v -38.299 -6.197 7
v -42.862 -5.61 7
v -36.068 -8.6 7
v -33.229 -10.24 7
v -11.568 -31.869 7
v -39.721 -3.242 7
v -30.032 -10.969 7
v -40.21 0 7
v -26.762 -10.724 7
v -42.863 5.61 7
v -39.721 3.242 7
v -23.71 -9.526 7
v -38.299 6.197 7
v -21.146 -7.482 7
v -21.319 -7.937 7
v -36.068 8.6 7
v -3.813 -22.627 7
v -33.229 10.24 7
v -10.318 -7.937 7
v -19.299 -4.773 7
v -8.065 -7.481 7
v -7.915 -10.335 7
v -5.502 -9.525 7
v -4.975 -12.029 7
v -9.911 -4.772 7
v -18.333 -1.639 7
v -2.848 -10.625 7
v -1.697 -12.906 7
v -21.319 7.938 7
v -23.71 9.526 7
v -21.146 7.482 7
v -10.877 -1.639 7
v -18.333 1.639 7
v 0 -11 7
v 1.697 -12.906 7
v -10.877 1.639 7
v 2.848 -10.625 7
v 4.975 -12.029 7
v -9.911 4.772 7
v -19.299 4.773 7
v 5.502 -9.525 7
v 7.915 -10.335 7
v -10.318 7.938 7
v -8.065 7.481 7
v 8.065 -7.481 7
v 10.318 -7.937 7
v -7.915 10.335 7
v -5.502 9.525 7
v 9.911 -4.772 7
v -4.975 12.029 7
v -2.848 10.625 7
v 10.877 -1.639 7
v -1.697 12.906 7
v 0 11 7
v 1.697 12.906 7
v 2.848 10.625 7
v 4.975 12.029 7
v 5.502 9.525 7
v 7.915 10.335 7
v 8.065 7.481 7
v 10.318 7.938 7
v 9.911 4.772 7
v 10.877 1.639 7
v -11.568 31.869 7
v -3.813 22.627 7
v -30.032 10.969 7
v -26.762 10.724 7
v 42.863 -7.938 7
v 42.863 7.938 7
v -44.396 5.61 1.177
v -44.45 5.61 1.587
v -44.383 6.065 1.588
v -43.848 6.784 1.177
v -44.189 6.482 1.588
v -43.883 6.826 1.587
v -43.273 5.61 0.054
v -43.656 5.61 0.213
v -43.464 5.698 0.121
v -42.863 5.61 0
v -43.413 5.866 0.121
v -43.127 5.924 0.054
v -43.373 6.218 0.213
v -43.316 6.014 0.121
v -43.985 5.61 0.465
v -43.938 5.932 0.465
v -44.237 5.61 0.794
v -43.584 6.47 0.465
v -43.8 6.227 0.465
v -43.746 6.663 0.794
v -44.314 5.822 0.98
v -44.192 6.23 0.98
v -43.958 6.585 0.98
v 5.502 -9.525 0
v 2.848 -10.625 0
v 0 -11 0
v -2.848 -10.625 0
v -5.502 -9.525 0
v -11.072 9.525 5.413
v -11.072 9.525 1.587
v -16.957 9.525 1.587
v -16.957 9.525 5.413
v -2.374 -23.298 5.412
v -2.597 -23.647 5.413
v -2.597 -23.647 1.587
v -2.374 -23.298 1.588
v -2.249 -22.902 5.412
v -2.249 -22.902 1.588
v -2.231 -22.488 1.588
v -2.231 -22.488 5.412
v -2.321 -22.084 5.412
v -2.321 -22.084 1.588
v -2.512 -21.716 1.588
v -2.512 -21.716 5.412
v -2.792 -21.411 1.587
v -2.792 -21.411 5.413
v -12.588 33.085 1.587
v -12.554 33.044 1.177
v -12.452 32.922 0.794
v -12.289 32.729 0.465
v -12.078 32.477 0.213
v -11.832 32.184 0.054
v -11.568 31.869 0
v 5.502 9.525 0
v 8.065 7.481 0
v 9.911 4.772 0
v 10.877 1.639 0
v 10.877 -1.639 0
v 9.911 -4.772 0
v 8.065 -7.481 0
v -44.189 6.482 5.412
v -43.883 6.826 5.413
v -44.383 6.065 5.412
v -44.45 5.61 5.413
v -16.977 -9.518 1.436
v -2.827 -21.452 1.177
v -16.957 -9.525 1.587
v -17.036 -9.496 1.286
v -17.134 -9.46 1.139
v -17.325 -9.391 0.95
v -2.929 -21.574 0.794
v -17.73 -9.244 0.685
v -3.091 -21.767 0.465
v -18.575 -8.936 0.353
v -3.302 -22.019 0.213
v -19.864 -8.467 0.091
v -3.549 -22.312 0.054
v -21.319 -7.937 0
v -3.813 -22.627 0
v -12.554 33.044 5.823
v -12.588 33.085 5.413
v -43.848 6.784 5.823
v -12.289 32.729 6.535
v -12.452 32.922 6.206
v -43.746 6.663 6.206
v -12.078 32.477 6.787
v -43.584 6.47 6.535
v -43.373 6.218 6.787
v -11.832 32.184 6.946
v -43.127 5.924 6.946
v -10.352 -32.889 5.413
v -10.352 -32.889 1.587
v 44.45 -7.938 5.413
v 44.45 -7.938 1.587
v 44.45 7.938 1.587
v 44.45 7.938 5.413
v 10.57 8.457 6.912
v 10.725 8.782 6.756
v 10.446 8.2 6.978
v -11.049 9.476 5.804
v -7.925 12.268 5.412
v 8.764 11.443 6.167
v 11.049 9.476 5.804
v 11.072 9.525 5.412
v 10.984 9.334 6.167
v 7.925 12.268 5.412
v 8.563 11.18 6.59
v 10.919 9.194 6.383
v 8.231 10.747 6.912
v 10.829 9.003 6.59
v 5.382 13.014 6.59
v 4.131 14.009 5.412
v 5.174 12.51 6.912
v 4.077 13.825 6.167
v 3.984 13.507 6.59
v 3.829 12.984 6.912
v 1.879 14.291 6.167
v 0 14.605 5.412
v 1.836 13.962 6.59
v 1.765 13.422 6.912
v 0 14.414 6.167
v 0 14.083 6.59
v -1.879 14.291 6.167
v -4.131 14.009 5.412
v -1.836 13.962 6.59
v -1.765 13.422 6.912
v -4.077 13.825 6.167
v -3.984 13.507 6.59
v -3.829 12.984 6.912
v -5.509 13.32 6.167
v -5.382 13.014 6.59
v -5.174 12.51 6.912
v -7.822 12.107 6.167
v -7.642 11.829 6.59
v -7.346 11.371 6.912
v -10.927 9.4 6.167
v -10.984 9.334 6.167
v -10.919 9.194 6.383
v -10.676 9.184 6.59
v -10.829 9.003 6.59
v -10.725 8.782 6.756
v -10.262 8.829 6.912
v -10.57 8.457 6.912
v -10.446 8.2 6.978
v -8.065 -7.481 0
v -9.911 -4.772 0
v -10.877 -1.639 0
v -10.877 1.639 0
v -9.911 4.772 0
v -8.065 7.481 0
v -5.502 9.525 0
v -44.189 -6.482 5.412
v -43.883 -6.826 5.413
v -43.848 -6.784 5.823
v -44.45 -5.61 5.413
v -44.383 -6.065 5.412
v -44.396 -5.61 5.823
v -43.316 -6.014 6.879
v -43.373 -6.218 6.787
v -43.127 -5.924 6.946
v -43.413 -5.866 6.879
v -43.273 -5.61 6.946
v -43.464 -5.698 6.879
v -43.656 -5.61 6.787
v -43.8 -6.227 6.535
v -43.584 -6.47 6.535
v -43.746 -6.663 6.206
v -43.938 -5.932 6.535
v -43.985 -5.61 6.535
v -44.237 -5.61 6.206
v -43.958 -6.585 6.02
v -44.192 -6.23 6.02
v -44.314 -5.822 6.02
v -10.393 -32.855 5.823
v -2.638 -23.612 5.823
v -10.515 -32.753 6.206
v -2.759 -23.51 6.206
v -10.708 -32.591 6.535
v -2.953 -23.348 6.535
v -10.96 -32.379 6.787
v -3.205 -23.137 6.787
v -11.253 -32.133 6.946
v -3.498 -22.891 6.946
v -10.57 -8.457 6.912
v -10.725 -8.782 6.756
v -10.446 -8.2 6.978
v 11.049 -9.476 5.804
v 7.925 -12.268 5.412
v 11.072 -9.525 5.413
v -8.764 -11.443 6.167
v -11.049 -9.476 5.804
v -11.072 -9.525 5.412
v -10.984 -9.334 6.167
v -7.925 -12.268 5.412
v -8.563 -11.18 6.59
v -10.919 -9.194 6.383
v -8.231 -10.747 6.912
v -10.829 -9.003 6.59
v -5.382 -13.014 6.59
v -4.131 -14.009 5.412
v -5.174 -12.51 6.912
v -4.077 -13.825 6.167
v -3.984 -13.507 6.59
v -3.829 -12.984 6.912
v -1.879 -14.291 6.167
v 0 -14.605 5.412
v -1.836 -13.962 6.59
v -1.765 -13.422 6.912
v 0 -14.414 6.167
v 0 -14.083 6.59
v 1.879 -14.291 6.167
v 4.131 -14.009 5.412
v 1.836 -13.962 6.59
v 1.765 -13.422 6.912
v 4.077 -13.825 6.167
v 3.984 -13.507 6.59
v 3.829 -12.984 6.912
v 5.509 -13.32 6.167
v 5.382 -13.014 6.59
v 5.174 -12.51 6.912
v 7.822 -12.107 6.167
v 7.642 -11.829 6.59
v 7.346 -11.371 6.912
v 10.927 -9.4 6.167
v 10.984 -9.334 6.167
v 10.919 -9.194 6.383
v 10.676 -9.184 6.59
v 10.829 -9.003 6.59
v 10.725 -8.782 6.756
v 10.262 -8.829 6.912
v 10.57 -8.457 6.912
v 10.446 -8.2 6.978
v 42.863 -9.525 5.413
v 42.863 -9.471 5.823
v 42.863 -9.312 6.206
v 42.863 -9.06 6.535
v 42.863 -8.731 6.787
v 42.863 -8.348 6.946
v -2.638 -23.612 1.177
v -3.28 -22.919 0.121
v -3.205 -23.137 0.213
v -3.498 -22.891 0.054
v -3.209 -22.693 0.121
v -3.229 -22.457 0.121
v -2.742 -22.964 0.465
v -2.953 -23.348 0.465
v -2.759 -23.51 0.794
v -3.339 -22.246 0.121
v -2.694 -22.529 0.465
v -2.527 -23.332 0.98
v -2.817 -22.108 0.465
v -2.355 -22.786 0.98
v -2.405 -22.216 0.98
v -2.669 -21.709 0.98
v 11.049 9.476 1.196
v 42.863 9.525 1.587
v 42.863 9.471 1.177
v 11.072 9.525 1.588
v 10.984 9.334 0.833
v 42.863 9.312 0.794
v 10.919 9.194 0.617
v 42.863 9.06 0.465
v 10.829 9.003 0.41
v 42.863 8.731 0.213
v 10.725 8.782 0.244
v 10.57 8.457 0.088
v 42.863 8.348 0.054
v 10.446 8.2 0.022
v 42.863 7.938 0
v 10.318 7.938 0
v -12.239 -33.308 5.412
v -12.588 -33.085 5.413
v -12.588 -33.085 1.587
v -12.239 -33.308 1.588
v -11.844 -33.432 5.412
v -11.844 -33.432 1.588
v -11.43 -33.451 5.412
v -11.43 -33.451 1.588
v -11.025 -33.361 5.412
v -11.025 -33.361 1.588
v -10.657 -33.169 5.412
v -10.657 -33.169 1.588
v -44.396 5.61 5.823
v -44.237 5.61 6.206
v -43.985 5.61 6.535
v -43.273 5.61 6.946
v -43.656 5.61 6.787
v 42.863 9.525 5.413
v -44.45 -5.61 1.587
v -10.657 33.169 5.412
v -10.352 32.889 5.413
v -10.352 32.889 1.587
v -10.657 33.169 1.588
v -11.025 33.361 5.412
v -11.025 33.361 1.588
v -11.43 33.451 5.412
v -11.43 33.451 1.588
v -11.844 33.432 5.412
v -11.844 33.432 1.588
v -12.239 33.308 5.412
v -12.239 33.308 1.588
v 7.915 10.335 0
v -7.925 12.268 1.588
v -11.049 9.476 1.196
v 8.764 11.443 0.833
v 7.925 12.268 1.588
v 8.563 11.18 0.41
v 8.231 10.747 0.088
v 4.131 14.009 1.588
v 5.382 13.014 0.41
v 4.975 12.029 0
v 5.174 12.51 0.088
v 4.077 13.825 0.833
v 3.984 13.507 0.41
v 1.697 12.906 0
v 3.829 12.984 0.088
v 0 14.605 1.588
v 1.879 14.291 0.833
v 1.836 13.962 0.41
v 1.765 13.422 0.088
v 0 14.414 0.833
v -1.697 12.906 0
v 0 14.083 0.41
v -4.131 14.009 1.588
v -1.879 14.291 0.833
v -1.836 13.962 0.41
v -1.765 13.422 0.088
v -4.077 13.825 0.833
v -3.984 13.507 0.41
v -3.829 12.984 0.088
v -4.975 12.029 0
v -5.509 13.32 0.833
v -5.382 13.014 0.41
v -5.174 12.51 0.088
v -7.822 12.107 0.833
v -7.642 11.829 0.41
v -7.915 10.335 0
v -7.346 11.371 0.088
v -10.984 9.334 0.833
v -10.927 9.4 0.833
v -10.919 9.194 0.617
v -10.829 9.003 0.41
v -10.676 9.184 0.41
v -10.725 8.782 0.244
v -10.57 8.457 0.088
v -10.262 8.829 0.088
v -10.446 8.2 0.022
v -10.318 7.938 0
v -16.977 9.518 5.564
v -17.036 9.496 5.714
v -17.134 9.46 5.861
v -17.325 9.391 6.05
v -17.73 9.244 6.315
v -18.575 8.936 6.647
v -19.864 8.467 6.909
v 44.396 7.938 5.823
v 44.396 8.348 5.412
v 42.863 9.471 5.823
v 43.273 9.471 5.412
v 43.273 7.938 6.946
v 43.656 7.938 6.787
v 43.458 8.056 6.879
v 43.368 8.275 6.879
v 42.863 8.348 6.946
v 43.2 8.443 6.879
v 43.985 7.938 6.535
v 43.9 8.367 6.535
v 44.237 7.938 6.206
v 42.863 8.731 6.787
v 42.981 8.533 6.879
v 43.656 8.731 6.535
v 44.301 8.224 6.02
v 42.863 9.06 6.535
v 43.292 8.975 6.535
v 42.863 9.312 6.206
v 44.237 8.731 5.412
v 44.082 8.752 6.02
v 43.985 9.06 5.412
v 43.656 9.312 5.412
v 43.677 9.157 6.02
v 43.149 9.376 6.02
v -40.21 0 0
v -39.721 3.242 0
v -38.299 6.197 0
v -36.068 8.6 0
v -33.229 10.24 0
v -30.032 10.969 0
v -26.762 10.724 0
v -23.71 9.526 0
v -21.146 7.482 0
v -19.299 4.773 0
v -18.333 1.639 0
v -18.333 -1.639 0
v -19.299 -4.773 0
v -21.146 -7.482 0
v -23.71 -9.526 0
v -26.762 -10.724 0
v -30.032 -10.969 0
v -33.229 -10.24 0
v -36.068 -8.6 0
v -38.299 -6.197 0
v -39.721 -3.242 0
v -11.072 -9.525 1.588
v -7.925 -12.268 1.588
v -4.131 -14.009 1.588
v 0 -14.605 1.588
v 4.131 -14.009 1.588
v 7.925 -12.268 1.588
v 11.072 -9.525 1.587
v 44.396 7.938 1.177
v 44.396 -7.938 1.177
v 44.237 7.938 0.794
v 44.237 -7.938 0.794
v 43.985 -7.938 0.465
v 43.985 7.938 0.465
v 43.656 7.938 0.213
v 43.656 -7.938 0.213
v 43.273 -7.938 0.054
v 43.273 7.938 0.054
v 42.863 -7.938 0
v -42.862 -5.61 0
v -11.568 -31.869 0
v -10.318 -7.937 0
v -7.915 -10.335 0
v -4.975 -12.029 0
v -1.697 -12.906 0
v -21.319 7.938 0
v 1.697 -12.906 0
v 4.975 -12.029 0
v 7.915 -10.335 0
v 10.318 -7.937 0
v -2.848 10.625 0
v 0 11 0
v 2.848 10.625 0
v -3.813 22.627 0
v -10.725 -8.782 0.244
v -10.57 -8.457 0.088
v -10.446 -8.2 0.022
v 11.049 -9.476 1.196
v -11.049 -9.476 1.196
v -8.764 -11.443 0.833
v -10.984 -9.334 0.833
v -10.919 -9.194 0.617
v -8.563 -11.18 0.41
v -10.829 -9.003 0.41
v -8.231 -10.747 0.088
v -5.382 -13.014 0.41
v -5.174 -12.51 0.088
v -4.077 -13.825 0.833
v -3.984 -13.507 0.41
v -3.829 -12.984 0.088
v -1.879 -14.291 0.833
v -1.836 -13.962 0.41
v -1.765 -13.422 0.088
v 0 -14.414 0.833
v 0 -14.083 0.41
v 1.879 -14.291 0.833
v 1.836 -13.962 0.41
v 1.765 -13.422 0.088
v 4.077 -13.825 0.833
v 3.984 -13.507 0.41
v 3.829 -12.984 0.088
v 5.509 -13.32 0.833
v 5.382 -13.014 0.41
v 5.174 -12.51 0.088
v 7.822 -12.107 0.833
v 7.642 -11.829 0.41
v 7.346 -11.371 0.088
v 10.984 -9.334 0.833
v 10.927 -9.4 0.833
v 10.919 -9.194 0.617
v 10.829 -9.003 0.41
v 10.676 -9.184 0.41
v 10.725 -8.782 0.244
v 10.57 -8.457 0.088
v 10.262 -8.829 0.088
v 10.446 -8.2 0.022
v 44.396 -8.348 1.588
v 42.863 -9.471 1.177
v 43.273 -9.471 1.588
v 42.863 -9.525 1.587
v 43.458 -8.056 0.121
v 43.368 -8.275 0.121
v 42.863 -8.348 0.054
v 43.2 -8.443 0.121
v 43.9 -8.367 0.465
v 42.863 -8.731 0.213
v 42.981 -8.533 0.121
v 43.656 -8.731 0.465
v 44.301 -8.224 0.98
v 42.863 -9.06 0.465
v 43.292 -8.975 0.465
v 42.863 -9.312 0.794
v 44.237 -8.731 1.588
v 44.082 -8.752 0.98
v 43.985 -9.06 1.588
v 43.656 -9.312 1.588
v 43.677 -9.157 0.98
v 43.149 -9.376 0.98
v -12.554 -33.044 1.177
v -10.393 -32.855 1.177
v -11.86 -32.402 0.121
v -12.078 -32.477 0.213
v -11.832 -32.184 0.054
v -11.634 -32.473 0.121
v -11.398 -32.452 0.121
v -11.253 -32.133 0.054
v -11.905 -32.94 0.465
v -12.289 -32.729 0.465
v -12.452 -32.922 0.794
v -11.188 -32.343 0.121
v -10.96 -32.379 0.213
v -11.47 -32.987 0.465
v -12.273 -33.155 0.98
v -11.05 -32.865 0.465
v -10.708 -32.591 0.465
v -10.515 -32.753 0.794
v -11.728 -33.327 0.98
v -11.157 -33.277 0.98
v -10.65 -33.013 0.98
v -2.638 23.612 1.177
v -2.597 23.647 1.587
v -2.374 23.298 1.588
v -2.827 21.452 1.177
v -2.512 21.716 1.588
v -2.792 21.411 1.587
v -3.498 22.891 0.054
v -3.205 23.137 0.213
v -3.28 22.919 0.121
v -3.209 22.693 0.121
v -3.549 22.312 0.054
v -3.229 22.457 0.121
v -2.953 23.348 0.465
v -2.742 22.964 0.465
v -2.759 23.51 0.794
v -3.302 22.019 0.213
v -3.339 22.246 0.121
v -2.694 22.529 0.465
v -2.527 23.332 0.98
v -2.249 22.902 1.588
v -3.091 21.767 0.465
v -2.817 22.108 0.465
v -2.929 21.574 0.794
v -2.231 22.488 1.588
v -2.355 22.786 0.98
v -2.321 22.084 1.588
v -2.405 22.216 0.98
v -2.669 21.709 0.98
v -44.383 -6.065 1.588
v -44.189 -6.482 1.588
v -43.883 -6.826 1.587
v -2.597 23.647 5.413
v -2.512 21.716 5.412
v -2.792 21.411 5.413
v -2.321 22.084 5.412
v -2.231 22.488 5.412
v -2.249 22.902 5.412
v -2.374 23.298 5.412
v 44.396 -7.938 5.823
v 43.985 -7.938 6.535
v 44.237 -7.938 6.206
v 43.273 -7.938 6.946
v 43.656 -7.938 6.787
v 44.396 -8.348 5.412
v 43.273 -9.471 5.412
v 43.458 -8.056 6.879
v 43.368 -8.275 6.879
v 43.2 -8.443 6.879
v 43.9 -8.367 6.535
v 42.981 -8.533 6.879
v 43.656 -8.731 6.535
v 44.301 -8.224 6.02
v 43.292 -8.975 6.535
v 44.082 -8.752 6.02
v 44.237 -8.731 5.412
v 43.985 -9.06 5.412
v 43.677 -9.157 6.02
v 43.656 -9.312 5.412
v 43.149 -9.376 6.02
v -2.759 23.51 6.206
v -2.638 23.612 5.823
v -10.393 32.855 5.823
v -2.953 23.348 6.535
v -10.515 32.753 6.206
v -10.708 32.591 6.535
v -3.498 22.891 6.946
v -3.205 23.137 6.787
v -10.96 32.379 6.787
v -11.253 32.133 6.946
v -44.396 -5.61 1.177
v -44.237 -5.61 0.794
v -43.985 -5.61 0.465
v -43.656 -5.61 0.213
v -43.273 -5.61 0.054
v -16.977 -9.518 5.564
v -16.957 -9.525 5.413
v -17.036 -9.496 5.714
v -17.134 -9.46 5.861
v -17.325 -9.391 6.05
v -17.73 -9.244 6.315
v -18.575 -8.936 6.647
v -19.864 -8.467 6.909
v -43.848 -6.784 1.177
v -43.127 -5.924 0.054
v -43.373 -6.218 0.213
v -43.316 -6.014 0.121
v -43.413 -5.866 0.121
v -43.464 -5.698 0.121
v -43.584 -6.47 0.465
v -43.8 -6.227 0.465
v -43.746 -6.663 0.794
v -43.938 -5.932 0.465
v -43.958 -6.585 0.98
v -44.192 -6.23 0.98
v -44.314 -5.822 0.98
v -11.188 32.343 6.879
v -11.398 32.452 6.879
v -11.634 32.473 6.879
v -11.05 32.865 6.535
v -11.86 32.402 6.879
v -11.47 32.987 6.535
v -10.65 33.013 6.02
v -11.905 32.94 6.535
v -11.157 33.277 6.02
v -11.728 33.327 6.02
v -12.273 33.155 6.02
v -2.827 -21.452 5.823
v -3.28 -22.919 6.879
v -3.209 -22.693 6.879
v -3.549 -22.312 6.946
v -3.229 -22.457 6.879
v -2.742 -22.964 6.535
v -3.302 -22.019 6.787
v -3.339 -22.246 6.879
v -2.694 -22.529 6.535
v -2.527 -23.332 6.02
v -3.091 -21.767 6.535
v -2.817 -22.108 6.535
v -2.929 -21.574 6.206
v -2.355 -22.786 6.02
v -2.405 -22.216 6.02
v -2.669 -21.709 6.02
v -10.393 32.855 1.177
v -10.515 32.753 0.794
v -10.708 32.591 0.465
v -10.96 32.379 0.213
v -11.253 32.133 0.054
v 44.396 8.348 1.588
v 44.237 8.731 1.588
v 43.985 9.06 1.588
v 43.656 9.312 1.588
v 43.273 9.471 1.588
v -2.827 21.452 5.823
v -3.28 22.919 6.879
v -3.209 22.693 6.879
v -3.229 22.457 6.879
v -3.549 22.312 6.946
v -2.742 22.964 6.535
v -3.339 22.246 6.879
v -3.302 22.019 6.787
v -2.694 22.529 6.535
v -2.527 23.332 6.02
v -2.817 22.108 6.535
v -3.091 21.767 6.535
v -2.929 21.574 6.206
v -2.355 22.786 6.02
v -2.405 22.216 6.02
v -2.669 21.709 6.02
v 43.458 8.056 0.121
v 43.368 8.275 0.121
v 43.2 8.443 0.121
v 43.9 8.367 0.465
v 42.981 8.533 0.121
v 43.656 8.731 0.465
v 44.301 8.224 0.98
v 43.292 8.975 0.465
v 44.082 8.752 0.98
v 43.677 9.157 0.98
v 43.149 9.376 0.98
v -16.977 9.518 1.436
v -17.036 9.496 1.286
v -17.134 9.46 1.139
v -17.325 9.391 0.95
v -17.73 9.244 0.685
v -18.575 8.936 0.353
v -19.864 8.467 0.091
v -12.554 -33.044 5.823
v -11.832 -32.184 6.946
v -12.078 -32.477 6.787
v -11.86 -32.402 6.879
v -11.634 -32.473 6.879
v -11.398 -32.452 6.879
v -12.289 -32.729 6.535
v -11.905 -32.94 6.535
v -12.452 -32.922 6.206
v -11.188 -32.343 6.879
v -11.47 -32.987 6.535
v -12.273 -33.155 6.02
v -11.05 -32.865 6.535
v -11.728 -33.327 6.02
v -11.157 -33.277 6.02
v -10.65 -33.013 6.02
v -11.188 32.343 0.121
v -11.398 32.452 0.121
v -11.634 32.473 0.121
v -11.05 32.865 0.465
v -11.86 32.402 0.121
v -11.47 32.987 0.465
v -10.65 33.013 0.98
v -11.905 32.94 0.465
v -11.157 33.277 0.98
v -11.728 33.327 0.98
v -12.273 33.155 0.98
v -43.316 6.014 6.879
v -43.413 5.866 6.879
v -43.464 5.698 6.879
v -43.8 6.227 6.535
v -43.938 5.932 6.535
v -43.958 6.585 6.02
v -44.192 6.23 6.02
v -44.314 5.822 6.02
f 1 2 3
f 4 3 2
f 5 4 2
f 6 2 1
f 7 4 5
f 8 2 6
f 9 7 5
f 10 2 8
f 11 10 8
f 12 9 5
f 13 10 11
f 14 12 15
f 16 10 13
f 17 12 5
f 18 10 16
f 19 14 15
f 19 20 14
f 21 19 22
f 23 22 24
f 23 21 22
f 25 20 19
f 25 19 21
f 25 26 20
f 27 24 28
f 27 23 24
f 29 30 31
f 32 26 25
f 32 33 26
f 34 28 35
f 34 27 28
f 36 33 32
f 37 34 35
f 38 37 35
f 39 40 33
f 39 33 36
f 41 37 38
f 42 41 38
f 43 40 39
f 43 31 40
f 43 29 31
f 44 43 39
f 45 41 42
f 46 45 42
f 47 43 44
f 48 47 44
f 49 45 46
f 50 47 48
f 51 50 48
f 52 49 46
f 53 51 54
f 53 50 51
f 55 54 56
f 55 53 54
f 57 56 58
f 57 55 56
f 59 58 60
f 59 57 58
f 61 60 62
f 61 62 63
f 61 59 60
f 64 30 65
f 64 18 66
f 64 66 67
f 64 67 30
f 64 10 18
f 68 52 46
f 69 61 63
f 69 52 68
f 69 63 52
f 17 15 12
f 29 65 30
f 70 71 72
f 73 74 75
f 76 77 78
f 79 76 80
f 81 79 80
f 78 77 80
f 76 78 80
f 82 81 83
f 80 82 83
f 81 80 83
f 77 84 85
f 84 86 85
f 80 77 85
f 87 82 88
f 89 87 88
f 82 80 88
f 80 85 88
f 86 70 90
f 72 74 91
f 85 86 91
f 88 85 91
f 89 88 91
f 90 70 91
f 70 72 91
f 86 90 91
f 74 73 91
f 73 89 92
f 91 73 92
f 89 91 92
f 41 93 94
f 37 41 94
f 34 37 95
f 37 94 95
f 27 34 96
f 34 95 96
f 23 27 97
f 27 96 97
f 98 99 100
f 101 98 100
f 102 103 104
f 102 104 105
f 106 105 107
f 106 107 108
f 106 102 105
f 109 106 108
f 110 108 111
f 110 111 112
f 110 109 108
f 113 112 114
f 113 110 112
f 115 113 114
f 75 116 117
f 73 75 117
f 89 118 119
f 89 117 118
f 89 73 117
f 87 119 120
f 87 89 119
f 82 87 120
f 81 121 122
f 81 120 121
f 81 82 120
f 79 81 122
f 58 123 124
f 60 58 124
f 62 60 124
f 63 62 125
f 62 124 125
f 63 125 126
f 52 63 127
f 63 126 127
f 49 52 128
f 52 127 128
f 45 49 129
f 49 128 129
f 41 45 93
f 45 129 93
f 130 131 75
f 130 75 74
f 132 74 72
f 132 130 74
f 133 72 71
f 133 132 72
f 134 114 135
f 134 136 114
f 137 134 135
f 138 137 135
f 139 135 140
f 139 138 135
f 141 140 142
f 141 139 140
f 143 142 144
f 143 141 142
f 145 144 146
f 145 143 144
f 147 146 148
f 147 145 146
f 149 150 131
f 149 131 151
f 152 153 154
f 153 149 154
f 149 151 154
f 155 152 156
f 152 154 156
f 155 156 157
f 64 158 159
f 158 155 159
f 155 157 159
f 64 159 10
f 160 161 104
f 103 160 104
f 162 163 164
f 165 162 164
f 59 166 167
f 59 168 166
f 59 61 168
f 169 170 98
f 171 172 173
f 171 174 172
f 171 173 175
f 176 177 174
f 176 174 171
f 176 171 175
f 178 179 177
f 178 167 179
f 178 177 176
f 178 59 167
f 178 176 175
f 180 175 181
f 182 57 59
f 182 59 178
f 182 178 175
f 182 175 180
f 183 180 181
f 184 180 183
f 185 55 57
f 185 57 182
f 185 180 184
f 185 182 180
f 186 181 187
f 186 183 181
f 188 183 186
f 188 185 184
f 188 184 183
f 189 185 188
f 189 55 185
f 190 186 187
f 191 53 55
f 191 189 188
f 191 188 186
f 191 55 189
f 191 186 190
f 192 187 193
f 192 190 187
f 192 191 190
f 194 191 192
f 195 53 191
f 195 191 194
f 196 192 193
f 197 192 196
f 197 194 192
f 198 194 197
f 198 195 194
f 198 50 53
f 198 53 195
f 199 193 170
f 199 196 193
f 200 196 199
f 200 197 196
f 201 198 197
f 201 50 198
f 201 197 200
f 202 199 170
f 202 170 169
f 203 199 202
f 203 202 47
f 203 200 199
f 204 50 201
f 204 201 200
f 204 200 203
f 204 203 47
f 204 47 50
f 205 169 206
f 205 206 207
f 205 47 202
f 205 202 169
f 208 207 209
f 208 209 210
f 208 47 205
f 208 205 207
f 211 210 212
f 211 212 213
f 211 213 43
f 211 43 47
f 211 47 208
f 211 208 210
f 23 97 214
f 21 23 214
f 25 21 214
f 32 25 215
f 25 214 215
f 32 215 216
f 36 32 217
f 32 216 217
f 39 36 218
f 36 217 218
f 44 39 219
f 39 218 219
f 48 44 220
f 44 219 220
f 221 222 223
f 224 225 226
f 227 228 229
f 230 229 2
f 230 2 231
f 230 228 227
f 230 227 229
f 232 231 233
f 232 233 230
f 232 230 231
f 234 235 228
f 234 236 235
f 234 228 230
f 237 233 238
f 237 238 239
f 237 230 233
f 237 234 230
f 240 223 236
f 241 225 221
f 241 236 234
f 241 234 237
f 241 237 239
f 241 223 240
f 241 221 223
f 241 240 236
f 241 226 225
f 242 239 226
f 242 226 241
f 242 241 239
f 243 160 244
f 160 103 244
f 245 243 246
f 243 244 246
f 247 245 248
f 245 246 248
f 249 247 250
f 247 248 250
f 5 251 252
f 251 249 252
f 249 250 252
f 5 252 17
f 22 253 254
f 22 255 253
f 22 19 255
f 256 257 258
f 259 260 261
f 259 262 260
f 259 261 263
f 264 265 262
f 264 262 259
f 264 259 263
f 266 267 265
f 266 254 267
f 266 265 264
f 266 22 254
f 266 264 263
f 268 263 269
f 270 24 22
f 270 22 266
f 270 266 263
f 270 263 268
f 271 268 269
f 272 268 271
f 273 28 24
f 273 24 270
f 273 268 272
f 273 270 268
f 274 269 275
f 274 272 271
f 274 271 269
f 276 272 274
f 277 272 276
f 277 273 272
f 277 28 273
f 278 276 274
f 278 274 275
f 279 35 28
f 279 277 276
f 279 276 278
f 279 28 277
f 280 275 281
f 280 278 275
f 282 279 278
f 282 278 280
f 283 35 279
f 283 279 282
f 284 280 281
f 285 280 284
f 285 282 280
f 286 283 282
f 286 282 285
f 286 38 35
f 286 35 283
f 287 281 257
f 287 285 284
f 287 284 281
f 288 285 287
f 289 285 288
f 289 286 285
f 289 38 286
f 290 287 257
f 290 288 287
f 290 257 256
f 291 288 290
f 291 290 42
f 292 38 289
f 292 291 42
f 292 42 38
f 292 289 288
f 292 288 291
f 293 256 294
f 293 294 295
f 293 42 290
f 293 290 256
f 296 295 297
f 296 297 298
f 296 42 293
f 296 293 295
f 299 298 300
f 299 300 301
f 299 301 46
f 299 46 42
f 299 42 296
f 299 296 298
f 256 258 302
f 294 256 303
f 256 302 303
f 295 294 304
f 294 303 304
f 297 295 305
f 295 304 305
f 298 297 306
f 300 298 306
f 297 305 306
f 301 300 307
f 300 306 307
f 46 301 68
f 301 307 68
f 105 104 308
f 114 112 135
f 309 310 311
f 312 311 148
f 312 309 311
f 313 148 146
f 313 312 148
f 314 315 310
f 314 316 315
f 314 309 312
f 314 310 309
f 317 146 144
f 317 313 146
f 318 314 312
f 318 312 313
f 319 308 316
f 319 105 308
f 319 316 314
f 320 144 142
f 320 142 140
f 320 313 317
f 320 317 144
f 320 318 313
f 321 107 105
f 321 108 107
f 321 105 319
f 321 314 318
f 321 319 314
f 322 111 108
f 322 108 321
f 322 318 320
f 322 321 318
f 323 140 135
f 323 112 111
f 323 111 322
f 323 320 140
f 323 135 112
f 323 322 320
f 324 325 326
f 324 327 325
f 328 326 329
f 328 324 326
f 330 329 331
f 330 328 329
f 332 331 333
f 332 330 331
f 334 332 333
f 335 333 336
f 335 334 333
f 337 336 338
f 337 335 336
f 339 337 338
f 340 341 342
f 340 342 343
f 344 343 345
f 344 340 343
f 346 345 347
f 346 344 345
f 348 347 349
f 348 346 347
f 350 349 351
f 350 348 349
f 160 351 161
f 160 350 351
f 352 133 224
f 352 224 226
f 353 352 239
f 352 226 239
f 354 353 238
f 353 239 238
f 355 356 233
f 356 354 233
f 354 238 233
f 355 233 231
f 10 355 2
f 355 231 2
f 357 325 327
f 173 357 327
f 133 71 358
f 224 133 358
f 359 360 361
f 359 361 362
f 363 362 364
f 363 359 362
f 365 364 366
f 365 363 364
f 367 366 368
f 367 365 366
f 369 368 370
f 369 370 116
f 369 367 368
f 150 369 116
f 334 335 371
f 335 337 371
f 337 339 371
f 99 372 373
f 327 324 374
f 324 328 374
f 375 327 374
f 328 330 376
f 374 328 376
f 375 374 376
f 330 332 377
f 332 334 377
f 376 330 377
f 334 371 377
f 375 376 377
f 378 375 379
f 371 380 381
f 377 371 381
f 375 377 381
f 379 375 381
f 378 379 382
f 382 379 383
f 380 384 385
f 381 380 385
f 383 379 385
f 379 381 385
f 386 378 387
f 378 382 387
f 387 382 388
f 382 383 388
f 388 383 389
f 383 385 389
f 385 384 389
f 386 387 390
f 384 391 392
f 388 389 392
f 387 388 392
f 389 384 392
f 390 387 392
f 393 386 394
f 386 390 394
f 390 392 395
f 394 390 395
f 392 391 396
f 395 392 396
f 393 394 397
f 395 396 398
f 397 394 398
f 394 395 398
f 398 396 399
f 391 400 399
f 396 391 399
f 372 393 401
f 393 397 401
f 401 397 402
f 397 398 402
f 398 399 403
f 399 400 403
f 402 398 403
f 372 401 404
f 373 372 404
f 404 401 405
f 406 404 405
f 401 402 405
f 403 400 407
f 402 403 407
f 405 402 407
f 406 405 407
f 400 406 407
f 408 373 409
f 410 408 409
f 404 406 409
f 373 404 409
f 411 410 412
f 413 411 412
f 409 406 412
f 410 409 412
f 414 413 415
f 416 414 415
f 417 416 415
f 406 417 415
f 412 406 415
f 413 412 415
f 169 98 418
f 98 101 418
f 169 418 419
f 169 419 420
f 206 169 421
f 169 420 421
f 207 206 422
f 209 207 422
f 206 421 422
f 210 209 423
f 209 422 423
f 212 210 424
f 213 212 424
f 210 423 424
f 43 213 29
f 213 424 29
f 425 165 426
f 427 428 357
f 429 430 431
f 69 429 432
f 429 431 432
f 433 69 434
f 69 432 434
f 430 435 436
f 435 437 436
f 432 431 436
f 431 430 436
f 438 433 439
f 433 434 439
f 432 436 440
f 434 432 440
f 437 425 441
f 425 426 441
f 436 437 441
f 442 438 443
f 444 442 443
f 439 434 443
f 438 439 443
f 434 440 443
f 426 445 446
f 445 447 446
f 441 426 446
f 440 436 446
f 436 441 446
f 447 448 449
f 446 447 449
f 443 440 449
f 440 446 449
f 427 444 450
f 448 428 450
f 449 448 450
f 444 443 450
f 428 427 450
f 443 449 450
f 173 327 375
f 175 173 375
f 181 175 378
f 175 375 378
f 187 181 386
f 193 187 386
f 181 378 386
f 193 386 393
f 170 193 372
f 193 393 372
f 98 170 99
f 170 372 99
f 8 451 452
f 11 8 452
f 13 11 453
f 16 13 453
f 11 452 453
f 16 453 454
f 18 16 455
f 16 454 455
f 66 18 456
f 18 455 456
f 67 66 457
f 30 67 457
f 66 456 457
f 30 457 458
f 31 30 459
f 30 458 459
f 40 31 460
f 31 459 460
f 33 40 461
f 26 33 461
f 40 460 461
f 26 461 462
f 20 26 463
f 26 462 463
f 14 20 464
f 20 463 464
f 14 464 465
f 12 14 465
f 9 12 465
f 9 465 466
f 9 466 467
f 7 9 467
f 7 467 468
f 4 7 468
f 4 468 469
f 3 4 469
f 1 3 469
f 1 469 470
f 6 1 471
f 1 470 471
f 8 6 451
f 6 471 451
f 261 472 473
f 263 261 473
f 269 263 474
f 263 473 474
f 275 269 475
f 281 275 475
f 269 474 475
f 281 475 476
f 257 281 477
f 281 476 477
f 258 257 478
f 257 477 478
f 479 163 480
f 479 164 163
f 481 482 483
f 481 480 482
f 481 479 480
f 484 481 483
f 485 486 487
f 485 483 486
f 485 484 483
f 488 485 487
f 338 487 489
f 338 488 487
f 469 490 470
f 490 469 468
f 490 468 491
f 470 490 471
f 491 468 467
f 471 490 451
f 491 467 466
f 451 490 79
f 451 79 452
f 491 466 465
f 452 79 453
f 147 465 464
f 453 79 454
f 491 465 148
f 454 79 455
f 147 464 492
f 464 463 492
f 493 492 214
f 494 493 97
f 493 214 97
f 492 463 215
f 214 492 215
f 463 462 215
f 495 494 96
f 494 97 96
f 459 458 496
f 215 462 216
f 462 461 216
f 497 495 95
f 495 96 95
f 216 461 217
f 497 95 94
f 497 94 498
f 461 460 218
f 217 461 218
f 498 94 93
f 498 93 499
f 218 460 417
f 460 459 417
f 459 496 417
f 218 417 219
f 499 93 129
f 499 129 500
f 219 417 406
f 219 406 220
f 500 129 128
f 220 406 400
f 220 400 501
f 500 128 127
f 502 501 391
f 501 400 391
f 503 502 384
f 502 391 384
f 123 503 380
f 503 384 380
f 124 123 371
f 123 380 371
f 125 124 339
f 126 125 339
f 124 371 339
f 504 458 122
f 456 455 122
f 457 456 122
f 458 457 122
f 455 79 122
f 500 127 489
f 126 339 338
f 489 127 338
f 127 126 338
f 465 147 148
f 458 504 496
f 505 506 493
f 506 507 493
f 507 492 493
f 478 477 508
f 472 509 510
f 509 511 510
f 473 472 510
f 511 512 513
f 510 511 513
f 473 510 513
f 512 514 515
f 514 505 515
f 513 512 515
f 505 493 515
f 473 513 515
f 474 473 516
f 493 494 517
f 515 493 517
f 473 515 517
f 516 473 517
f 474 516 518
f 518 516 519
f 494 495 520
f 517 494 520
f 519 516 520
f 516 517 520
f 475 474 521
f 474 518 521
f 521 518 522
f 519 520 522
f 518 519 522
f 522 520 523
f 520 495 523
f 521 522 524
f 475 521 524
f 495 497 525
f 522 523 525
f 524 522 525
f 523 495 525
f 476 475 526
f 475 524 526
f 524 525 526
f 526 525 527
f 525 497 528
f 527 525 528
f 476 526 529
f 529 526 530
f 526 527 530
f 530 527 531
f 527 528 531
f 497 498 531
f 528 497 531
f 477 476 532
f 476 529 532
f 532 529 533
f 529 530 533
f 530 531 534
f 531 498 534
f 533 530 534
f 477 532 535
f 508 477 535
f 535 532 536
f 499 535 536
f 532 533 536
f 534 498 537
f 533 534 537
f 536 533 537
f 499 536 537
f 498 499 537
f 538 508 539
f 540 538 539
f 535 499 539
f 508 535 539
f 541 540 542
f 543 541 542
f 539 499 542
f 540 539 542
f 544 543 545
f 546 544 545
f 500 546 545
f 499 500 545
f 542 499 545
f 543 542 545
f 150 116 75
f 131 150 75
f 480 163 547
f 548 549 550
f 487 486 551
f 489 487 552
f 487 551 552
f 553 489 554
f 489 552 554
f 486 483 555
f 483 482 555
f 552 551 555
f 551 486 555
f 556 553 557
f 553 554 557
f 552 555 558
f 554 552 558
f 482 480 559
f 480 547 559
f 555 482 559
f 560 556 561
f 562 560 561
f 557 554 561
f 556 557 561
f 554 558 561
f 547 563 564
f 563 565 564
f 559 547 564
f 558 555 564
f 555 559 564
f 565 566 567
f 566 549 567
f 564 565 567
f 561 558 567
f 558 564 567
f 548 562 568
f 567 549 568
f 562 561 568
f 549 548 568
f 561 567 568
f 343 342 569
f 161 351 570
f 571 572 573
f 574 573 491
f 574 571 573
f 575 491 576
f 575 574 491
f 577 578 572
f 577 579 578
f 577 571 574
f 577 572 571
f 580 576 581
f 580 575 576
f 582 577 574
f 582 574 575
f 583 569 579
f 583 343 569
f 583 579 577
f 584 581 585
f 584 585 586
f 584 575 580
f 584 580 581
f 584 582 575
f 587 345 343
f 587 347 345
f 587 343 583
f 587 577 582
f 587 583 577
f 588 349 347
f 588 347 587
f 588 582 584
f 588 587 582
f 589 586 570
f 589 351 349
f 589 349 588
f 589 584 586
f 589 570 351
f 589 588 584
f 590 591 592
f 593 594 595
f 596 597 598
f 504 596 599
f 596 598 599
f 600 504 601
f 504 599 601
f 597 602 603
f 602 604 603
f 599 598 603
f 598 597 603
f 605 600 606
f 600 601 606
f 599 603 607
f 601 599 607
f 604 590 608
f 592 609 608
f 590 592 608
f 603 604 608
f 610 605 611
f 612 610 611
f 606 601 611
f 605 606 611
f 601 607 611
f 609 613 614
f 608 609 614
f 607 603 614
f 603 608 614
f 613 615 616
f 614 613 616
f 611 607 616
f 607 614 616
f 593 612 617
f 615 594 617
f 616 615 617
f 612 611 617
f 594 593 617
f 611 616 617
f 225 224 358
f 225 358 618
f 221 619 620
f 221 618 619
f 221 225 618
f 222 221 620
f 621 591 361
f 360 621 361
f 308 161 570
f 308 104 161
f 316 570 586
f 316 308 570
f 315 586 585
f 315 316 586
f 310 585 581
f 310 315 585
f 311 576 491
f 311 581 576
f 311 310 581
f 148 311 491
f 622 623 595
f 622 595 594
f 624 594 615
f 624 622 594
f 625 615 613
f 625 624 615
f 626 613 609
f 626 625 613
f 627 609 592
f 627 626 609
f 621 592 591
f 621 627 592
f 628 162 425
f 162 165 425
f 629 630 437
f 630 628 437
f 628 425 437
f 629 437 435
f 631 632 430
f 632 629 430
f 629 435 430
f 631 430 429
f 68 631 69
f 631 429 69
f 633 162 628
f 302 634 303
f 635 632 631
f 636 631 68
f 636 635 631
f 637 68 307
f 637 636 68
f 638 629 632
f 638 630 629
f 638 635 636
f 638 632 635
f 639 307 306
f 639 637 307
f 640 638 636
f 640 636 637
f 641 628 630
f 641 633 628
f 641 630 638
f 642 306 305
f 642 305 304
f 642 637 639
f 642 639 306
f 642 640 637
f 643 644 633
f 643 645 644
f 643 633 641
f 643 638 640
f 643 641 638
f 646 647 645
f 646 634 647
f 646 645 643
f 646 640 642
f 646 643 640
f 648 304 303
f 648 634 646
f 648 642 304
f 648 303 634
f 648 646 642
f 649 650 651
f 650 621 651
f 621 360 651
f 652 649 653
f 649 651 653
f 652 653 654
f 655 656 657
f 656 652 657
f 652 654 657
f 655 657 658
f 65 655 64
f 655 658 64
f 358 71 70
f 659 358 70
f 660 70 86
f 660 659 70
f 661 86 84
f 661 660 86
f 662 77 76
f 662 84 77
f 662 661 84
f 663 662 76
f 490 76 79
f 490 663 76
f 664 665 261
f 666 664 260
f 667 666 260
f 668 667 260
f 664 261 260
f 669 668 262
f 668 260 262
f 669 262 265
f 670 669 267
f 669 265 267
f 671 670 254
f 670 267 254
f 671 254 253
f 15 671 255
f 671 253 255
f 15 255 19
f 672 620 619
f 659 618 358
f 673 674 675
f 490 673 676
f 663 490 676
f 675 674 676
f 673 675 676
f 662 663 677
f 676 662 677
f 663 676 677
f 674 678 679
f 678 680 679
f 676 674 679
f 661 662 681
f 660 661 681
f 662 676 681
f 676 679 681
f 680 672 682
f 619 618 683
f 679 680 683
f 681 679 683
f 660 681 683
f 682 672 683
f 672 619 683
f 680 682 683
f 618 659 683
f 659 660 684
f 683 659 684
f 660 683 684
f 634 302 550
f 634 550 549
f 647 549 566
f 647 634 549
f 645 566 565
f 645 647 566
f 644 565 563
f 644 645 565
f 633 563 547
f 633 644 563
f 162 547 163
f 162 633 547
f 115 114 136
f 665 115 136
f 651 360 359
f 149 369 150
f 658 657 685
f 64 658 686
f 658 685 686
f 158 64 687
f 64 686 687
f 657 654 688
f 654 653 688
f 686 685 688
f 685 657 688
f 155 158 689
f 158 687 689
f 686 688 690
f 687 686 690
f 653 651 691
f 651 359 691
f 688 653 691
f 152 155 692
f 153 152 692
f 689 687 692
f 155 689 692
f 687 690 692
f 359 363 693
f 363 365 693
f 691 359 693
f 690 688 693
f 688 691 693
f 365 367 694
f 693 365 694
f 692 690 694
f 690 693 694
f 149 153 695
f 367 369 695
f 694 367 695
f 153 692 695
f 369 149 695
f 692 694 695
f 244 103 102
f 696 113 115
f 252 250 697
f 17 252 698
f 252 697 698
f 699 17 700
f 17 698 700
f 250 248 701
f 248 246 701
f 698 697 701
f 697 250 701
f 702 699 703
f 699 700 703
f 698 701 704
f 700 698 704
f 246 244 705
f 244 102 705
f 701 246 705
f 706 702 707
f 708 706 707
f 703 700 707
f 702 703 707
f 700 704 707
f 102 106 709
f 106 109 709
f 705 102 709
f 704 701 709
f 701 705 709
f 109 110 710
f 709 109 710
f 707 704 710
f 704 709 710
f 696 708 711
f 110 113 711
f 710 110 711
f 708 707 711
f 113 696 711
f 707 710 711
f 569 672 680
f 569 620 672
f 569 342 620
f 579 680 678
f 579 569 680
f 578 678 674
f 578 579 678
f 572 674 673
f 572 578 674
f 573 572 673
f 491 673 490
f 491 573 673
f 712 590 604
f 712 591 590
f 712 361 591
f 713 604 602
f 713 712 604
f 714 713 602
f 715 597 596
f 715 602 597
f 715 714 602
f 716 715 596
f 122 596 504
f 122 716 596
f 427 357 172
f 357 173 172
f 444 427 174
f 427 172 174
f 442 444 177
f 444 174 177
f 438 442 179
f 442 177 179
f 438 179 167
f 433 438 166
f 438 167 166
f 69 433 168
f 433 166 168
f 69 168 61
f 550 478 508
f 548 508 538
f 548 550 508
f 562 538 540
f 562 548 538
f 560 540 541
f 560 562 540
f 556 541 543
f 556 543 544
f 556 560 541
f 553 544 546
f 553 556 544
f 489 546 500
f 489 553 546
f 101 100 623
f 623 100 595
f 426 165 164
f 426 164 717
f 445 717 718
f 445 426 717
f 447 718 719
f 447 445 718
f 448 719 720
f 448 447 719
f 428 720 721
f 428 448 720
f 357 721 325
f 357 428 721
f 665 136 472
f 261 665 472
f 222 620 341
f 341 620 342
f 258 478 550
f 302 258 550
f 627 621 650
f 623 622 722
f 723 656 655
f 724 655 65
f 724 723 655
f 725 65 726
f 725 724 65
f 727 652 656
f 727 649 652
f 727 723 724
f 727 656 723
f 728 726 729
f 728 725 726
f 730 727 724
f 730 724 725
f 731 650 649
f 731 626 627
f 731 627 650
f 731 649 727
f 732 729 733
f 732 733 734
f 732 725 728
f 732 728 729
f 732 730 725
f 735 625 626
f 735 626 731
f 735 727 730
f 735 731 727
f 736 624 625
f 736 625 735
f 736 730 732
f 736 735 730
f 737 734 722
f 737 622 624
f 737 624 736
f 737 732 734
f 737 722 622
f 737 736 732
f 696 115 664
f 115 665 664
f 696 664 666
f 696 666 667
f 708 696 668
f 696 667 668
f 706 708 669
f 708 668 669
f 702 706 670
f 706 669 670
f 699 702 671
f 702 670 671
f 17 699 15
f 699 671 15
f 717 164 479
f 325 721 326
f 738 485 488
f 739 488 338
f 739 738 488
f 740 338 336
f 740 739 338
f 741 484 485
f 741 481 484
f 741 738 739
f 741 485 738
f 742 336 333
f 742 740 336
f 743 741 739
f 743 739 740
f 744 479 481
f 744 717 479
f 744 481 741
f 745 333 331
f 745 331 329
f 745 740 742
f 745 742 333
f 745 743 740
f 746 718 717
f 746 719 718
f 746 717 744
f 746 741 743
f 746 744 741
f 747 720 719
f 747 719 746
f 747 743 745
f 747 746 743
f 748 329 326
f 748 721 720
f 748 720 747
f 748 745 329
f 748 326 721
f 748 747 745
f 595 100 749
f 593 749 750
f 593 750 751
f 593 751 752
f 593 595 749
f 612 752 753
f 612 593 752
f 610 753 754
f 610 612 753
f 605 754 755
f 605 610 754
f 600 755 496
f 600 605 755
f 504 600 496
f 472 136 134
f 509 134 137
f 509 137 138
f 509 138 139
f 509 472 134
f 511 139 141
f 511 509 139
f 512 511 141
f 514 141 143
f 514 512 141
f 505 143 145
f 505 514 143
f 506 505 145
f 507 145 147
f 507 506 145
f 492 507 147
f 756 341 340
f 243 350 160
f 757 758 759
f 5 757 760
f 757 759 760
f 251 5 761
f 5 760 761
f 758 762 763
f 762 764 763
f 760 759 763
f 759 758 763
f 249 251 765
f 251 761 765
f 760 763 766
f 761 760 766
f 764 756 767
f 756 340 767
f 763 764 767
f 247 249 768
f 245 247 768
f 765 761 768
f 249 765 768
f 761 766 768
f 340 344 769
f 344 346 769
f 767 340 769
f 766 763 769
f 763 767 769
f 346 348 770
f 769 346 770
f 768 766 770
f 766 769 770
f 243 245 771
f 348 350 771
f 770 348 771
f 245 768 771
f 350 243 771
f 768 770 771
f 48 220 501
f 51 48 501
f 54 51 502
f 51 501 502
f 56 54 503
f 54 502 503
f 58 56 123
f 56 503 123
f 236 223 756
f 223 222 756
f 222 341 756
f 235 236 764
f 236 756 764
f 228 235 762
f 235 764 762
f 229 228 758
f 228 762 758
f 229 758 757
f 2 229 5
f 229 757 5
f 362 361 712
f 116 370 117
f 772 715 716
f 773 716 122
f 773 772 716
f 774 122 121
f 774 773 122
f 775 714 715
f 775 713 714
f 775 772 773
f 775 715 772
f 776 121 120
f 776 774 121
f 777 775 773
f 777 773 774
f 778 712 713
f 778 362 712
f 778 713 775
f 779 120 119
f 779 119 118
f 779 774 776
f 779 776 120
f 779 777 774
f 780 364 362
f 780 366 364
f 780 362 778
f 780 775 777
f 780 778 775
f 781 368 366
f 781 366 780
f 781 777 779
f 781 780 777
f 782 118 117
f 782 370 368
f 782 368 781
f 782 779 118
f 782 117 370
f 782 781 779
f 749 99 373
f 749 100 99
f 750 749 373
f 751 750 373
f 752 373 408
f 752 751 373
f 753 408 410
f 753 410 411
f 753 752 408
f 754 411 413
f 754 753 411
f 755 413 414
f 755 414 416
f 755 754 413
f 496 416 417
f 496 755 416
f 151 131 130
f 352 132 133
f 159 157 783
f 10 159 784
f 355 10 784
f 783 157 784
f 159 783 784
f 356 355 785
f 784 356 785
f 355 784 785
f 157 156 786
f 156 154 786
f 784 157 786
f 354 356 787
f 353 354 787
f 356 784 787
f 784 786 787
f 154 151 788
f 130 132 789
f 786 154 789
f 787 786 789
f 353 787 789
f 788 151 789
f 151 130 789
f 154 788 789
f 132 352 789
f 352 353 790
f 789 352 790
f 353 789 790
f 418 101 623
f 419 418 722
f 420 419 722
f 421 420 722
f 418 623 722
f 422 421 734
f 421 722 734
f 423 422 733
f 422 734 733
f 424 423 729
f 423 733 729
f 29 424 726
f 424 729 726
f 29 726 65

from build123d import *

# Parameters (mm, degrees)
F1_DEPTH = 7
F2_R     = 1.5875


with BuildPart() as f1:
    # F0 (on Top) → F1 (new body)
    with BuildSketch(Plane.XY):
        with BuildLine():
            ThreePointArc((11.0716033166, 9.525), (13.6931879312, 5.0796288526), (14.605, 0))
            Line((14.605, 0), (44.45, 0))
            Line((44.45, 0), (44.45, 9.525))
            Line((44.45, 9.525), (11.0716033166, 9.525))
        make_face()
        with BuildLine():
            Line((44.45, 0), (14.605, 0))
            ThreePointArc((14.605, 0), (13.6931879312, -5.0796288526), (11.0716033166, -9.525))
            Line((11.0716033166, -9.525), (44.45, -9.525))
            Line((44.45, -9.525), (44.45, 0))
        make_face()
        with BuildLine():
            ThreePointArc((-5.5022154629, 9.525), (0, 11), (5.5022154629, 9.525))
            Line((5.5022154629, 9.525), (11.0716033166, 9.525))
            ThreePointArc((11.0716033166, 9.525), (0, 14.605), (-11.0716033166, 9.525))
            Line((-11.0716033166, 9.525), (-5.5022154629, 9.525))
        make_face()
        with BuildLine():
            Line((11.0716033166, -9.525), (5.5022154629, -9.525))
            ThreePointArc((5.5022154629, -9.525), (0, -11), (-5.5022154629, -9.525))
            Line((-5.5022154629, -9.525), (-11.0716033166, -9.525))
            ThreePointArc((-11.0716033166, -9.525), (0, -14.605), (11.0716033166, -9.525))
        make_face()
        with BuildLine():
            Line((-16.9569512222, -9.525), (-11.0716033166, -9.525))
            ThreePointArc((-11.0716033166, -9.525), (-13.6931879312, -5.0796288526), (-14.605, 0))
            Line((-14.605, 0), (-18.21, 0))
            ThreePointArc((-18.21, 0), (-29.21, -11), (-40.21, 0))
            Line((-40.21, 0), (-44.45, 0))
            Line((-44.45, 0), (-44.45, -6.35))
            Line((-44.45, -6.35), (-11.3722009461, -34.1055689863))
            Line((-11.3722009461, -34.1055689863), (-1.5761177745, -22.4310516731))
            Line((-1.5761177745, -22.4310516731), (-16.9569512222, -9.525))
        make_face()
        with BuildLine():
            ThreePointArc((5.5022154629, 9.525), (9.5269189692, 5.498892157), (11, 0))
            Line((11, 0), (14.605, 0))
            ThreePointArc((14.605, 0), (13.6931879312, 5.0796288526), (11.0716033166, 9.525))
            Line((11.0716033166, 9.525), (5.5022154629, 9.525))
        make_face()
        with BuildLine():
            ThreePointArc((-11, 0), (-9.5269189692, 5.498892157), (-5.5022154629, 9.525))
            Line((-5.5022154629, 9.525), (-11.0716033166, 9.525))
            ThreePointArc((-11.0716033166, 9.525), (-13.6931879312, 5.0796288526), (-14.605, 0))
            Line((-14.605, 0), (-11, 0))
        make_face()
        with BuildLine():
            Line((-11.0716033166, -9.525), (-5.5022154629, -9.525))
            ThreePointArc((-5.5022154629, -9.525), (-9.5269189692, -5.498892157), (-11, 0))
            Line((-11, 0), (-14.605, 0))
            ThreePointArc((-14.605, 0), (-13.6931879312, -5.0796288526), (-11.0716033166, -9.525))
        make_face()
        with BuildLine():
            Line((14.605, 0), (11, 0))
            ThreePointArc((11, 0), (9.5269189692, -5.498892157), (5.5022154629, -9.525))
            Line((5.5022154629, -9.525), (11.0716033166, -9.525))
            ThreePointArc((11.0716033166, -9.525), (13.6931879312, -5.0796288526), (14.605, 0))
        make_face()
        with BuildLine():
            ThreePointArc((-14.605, 0), (-13.6931879312, 5.0796288526), (-11.0716033166, 9.525))
            Line((-11.0716033166, 9.525), (-16.9569512222, 9.525))
            Line((-16.9569512222, 9.525), (-1.5761177745, 22.4310516731))
            Line((-1.5761177745, 22.4310516731), (-11.3722009461, 34.1055689863))
            Line((-11.3722009461, 34.1055689863), (-44.45, 6.35))
            Line((-44.45, 6.35), (-44.45, 0))
            Line((-44.45, 0), (-40.21, 0))
            ThreePointArc((-40.21, 0), (-29.21, 11), (-18.21, 0))
            Line((-18.21, 0), (-14.605, 0))
        make_face()
    extrude(amount=F1_DEPTH)

    # F2
    f2_edges = [f1.edges().sort_by_distance(p)[0] for p in [
        (-44.45, -6.35, 3.5),
        (-11.372201, -34.105569, 3.5),
        (-27.9111, -20.227784, 0),
        (-27.9111, -20.227784, 7),
        (-1.576118, -22.431052, 3.5),
        (-6.474159, -28.26831, 0),
        (-6.474159, -28.26831, 7),
        (44.45, -9.525, 3.5),
        (44.45, 9.525, 3.5),
        (44.45, 0, 0),
        (44.45, 0, 7),
        (-1.576118, 22.431052, 3.5),
        (-11.372201, 34.105569, 3.5),
        (-6.474159, 28.26831, 0),
        (-6.474159, 28.26831, 7),
        (-44.45, 0, 7),
        (-44.45, 6.35, 3.5),
        (-44.45, 0, 0),
        (-27.9111, 20.227784, 0),
        (-27.9111, 20.227784, 7),
        (-9.266534, 15.978026, 7),
        (-14.014277, 9.525, 7),
        (-9.266534, 15.978026, 0),
        (-14.014277, 9.525, 0),
        (0, 14.605, 0),
        (0, 14.605, 7),
        (27.760802, 9.525, 7),
        (27.760802, 9.525, 0),
        (27.760802, -9.525, 7),
        (0, -14.605, 7),
        (-14.014277, -9.525, 7),
        (-9.266534, -15.978026, 7),
        (-9.266534, -15.978026, 0),
        (27.760802, -9.525, 0),
        (0, -14.605, 0),
        (-14.014277, -9.525, 0),
    ]]
    fillet(f2_edges, radius=F2_R)


solid = f1.part
